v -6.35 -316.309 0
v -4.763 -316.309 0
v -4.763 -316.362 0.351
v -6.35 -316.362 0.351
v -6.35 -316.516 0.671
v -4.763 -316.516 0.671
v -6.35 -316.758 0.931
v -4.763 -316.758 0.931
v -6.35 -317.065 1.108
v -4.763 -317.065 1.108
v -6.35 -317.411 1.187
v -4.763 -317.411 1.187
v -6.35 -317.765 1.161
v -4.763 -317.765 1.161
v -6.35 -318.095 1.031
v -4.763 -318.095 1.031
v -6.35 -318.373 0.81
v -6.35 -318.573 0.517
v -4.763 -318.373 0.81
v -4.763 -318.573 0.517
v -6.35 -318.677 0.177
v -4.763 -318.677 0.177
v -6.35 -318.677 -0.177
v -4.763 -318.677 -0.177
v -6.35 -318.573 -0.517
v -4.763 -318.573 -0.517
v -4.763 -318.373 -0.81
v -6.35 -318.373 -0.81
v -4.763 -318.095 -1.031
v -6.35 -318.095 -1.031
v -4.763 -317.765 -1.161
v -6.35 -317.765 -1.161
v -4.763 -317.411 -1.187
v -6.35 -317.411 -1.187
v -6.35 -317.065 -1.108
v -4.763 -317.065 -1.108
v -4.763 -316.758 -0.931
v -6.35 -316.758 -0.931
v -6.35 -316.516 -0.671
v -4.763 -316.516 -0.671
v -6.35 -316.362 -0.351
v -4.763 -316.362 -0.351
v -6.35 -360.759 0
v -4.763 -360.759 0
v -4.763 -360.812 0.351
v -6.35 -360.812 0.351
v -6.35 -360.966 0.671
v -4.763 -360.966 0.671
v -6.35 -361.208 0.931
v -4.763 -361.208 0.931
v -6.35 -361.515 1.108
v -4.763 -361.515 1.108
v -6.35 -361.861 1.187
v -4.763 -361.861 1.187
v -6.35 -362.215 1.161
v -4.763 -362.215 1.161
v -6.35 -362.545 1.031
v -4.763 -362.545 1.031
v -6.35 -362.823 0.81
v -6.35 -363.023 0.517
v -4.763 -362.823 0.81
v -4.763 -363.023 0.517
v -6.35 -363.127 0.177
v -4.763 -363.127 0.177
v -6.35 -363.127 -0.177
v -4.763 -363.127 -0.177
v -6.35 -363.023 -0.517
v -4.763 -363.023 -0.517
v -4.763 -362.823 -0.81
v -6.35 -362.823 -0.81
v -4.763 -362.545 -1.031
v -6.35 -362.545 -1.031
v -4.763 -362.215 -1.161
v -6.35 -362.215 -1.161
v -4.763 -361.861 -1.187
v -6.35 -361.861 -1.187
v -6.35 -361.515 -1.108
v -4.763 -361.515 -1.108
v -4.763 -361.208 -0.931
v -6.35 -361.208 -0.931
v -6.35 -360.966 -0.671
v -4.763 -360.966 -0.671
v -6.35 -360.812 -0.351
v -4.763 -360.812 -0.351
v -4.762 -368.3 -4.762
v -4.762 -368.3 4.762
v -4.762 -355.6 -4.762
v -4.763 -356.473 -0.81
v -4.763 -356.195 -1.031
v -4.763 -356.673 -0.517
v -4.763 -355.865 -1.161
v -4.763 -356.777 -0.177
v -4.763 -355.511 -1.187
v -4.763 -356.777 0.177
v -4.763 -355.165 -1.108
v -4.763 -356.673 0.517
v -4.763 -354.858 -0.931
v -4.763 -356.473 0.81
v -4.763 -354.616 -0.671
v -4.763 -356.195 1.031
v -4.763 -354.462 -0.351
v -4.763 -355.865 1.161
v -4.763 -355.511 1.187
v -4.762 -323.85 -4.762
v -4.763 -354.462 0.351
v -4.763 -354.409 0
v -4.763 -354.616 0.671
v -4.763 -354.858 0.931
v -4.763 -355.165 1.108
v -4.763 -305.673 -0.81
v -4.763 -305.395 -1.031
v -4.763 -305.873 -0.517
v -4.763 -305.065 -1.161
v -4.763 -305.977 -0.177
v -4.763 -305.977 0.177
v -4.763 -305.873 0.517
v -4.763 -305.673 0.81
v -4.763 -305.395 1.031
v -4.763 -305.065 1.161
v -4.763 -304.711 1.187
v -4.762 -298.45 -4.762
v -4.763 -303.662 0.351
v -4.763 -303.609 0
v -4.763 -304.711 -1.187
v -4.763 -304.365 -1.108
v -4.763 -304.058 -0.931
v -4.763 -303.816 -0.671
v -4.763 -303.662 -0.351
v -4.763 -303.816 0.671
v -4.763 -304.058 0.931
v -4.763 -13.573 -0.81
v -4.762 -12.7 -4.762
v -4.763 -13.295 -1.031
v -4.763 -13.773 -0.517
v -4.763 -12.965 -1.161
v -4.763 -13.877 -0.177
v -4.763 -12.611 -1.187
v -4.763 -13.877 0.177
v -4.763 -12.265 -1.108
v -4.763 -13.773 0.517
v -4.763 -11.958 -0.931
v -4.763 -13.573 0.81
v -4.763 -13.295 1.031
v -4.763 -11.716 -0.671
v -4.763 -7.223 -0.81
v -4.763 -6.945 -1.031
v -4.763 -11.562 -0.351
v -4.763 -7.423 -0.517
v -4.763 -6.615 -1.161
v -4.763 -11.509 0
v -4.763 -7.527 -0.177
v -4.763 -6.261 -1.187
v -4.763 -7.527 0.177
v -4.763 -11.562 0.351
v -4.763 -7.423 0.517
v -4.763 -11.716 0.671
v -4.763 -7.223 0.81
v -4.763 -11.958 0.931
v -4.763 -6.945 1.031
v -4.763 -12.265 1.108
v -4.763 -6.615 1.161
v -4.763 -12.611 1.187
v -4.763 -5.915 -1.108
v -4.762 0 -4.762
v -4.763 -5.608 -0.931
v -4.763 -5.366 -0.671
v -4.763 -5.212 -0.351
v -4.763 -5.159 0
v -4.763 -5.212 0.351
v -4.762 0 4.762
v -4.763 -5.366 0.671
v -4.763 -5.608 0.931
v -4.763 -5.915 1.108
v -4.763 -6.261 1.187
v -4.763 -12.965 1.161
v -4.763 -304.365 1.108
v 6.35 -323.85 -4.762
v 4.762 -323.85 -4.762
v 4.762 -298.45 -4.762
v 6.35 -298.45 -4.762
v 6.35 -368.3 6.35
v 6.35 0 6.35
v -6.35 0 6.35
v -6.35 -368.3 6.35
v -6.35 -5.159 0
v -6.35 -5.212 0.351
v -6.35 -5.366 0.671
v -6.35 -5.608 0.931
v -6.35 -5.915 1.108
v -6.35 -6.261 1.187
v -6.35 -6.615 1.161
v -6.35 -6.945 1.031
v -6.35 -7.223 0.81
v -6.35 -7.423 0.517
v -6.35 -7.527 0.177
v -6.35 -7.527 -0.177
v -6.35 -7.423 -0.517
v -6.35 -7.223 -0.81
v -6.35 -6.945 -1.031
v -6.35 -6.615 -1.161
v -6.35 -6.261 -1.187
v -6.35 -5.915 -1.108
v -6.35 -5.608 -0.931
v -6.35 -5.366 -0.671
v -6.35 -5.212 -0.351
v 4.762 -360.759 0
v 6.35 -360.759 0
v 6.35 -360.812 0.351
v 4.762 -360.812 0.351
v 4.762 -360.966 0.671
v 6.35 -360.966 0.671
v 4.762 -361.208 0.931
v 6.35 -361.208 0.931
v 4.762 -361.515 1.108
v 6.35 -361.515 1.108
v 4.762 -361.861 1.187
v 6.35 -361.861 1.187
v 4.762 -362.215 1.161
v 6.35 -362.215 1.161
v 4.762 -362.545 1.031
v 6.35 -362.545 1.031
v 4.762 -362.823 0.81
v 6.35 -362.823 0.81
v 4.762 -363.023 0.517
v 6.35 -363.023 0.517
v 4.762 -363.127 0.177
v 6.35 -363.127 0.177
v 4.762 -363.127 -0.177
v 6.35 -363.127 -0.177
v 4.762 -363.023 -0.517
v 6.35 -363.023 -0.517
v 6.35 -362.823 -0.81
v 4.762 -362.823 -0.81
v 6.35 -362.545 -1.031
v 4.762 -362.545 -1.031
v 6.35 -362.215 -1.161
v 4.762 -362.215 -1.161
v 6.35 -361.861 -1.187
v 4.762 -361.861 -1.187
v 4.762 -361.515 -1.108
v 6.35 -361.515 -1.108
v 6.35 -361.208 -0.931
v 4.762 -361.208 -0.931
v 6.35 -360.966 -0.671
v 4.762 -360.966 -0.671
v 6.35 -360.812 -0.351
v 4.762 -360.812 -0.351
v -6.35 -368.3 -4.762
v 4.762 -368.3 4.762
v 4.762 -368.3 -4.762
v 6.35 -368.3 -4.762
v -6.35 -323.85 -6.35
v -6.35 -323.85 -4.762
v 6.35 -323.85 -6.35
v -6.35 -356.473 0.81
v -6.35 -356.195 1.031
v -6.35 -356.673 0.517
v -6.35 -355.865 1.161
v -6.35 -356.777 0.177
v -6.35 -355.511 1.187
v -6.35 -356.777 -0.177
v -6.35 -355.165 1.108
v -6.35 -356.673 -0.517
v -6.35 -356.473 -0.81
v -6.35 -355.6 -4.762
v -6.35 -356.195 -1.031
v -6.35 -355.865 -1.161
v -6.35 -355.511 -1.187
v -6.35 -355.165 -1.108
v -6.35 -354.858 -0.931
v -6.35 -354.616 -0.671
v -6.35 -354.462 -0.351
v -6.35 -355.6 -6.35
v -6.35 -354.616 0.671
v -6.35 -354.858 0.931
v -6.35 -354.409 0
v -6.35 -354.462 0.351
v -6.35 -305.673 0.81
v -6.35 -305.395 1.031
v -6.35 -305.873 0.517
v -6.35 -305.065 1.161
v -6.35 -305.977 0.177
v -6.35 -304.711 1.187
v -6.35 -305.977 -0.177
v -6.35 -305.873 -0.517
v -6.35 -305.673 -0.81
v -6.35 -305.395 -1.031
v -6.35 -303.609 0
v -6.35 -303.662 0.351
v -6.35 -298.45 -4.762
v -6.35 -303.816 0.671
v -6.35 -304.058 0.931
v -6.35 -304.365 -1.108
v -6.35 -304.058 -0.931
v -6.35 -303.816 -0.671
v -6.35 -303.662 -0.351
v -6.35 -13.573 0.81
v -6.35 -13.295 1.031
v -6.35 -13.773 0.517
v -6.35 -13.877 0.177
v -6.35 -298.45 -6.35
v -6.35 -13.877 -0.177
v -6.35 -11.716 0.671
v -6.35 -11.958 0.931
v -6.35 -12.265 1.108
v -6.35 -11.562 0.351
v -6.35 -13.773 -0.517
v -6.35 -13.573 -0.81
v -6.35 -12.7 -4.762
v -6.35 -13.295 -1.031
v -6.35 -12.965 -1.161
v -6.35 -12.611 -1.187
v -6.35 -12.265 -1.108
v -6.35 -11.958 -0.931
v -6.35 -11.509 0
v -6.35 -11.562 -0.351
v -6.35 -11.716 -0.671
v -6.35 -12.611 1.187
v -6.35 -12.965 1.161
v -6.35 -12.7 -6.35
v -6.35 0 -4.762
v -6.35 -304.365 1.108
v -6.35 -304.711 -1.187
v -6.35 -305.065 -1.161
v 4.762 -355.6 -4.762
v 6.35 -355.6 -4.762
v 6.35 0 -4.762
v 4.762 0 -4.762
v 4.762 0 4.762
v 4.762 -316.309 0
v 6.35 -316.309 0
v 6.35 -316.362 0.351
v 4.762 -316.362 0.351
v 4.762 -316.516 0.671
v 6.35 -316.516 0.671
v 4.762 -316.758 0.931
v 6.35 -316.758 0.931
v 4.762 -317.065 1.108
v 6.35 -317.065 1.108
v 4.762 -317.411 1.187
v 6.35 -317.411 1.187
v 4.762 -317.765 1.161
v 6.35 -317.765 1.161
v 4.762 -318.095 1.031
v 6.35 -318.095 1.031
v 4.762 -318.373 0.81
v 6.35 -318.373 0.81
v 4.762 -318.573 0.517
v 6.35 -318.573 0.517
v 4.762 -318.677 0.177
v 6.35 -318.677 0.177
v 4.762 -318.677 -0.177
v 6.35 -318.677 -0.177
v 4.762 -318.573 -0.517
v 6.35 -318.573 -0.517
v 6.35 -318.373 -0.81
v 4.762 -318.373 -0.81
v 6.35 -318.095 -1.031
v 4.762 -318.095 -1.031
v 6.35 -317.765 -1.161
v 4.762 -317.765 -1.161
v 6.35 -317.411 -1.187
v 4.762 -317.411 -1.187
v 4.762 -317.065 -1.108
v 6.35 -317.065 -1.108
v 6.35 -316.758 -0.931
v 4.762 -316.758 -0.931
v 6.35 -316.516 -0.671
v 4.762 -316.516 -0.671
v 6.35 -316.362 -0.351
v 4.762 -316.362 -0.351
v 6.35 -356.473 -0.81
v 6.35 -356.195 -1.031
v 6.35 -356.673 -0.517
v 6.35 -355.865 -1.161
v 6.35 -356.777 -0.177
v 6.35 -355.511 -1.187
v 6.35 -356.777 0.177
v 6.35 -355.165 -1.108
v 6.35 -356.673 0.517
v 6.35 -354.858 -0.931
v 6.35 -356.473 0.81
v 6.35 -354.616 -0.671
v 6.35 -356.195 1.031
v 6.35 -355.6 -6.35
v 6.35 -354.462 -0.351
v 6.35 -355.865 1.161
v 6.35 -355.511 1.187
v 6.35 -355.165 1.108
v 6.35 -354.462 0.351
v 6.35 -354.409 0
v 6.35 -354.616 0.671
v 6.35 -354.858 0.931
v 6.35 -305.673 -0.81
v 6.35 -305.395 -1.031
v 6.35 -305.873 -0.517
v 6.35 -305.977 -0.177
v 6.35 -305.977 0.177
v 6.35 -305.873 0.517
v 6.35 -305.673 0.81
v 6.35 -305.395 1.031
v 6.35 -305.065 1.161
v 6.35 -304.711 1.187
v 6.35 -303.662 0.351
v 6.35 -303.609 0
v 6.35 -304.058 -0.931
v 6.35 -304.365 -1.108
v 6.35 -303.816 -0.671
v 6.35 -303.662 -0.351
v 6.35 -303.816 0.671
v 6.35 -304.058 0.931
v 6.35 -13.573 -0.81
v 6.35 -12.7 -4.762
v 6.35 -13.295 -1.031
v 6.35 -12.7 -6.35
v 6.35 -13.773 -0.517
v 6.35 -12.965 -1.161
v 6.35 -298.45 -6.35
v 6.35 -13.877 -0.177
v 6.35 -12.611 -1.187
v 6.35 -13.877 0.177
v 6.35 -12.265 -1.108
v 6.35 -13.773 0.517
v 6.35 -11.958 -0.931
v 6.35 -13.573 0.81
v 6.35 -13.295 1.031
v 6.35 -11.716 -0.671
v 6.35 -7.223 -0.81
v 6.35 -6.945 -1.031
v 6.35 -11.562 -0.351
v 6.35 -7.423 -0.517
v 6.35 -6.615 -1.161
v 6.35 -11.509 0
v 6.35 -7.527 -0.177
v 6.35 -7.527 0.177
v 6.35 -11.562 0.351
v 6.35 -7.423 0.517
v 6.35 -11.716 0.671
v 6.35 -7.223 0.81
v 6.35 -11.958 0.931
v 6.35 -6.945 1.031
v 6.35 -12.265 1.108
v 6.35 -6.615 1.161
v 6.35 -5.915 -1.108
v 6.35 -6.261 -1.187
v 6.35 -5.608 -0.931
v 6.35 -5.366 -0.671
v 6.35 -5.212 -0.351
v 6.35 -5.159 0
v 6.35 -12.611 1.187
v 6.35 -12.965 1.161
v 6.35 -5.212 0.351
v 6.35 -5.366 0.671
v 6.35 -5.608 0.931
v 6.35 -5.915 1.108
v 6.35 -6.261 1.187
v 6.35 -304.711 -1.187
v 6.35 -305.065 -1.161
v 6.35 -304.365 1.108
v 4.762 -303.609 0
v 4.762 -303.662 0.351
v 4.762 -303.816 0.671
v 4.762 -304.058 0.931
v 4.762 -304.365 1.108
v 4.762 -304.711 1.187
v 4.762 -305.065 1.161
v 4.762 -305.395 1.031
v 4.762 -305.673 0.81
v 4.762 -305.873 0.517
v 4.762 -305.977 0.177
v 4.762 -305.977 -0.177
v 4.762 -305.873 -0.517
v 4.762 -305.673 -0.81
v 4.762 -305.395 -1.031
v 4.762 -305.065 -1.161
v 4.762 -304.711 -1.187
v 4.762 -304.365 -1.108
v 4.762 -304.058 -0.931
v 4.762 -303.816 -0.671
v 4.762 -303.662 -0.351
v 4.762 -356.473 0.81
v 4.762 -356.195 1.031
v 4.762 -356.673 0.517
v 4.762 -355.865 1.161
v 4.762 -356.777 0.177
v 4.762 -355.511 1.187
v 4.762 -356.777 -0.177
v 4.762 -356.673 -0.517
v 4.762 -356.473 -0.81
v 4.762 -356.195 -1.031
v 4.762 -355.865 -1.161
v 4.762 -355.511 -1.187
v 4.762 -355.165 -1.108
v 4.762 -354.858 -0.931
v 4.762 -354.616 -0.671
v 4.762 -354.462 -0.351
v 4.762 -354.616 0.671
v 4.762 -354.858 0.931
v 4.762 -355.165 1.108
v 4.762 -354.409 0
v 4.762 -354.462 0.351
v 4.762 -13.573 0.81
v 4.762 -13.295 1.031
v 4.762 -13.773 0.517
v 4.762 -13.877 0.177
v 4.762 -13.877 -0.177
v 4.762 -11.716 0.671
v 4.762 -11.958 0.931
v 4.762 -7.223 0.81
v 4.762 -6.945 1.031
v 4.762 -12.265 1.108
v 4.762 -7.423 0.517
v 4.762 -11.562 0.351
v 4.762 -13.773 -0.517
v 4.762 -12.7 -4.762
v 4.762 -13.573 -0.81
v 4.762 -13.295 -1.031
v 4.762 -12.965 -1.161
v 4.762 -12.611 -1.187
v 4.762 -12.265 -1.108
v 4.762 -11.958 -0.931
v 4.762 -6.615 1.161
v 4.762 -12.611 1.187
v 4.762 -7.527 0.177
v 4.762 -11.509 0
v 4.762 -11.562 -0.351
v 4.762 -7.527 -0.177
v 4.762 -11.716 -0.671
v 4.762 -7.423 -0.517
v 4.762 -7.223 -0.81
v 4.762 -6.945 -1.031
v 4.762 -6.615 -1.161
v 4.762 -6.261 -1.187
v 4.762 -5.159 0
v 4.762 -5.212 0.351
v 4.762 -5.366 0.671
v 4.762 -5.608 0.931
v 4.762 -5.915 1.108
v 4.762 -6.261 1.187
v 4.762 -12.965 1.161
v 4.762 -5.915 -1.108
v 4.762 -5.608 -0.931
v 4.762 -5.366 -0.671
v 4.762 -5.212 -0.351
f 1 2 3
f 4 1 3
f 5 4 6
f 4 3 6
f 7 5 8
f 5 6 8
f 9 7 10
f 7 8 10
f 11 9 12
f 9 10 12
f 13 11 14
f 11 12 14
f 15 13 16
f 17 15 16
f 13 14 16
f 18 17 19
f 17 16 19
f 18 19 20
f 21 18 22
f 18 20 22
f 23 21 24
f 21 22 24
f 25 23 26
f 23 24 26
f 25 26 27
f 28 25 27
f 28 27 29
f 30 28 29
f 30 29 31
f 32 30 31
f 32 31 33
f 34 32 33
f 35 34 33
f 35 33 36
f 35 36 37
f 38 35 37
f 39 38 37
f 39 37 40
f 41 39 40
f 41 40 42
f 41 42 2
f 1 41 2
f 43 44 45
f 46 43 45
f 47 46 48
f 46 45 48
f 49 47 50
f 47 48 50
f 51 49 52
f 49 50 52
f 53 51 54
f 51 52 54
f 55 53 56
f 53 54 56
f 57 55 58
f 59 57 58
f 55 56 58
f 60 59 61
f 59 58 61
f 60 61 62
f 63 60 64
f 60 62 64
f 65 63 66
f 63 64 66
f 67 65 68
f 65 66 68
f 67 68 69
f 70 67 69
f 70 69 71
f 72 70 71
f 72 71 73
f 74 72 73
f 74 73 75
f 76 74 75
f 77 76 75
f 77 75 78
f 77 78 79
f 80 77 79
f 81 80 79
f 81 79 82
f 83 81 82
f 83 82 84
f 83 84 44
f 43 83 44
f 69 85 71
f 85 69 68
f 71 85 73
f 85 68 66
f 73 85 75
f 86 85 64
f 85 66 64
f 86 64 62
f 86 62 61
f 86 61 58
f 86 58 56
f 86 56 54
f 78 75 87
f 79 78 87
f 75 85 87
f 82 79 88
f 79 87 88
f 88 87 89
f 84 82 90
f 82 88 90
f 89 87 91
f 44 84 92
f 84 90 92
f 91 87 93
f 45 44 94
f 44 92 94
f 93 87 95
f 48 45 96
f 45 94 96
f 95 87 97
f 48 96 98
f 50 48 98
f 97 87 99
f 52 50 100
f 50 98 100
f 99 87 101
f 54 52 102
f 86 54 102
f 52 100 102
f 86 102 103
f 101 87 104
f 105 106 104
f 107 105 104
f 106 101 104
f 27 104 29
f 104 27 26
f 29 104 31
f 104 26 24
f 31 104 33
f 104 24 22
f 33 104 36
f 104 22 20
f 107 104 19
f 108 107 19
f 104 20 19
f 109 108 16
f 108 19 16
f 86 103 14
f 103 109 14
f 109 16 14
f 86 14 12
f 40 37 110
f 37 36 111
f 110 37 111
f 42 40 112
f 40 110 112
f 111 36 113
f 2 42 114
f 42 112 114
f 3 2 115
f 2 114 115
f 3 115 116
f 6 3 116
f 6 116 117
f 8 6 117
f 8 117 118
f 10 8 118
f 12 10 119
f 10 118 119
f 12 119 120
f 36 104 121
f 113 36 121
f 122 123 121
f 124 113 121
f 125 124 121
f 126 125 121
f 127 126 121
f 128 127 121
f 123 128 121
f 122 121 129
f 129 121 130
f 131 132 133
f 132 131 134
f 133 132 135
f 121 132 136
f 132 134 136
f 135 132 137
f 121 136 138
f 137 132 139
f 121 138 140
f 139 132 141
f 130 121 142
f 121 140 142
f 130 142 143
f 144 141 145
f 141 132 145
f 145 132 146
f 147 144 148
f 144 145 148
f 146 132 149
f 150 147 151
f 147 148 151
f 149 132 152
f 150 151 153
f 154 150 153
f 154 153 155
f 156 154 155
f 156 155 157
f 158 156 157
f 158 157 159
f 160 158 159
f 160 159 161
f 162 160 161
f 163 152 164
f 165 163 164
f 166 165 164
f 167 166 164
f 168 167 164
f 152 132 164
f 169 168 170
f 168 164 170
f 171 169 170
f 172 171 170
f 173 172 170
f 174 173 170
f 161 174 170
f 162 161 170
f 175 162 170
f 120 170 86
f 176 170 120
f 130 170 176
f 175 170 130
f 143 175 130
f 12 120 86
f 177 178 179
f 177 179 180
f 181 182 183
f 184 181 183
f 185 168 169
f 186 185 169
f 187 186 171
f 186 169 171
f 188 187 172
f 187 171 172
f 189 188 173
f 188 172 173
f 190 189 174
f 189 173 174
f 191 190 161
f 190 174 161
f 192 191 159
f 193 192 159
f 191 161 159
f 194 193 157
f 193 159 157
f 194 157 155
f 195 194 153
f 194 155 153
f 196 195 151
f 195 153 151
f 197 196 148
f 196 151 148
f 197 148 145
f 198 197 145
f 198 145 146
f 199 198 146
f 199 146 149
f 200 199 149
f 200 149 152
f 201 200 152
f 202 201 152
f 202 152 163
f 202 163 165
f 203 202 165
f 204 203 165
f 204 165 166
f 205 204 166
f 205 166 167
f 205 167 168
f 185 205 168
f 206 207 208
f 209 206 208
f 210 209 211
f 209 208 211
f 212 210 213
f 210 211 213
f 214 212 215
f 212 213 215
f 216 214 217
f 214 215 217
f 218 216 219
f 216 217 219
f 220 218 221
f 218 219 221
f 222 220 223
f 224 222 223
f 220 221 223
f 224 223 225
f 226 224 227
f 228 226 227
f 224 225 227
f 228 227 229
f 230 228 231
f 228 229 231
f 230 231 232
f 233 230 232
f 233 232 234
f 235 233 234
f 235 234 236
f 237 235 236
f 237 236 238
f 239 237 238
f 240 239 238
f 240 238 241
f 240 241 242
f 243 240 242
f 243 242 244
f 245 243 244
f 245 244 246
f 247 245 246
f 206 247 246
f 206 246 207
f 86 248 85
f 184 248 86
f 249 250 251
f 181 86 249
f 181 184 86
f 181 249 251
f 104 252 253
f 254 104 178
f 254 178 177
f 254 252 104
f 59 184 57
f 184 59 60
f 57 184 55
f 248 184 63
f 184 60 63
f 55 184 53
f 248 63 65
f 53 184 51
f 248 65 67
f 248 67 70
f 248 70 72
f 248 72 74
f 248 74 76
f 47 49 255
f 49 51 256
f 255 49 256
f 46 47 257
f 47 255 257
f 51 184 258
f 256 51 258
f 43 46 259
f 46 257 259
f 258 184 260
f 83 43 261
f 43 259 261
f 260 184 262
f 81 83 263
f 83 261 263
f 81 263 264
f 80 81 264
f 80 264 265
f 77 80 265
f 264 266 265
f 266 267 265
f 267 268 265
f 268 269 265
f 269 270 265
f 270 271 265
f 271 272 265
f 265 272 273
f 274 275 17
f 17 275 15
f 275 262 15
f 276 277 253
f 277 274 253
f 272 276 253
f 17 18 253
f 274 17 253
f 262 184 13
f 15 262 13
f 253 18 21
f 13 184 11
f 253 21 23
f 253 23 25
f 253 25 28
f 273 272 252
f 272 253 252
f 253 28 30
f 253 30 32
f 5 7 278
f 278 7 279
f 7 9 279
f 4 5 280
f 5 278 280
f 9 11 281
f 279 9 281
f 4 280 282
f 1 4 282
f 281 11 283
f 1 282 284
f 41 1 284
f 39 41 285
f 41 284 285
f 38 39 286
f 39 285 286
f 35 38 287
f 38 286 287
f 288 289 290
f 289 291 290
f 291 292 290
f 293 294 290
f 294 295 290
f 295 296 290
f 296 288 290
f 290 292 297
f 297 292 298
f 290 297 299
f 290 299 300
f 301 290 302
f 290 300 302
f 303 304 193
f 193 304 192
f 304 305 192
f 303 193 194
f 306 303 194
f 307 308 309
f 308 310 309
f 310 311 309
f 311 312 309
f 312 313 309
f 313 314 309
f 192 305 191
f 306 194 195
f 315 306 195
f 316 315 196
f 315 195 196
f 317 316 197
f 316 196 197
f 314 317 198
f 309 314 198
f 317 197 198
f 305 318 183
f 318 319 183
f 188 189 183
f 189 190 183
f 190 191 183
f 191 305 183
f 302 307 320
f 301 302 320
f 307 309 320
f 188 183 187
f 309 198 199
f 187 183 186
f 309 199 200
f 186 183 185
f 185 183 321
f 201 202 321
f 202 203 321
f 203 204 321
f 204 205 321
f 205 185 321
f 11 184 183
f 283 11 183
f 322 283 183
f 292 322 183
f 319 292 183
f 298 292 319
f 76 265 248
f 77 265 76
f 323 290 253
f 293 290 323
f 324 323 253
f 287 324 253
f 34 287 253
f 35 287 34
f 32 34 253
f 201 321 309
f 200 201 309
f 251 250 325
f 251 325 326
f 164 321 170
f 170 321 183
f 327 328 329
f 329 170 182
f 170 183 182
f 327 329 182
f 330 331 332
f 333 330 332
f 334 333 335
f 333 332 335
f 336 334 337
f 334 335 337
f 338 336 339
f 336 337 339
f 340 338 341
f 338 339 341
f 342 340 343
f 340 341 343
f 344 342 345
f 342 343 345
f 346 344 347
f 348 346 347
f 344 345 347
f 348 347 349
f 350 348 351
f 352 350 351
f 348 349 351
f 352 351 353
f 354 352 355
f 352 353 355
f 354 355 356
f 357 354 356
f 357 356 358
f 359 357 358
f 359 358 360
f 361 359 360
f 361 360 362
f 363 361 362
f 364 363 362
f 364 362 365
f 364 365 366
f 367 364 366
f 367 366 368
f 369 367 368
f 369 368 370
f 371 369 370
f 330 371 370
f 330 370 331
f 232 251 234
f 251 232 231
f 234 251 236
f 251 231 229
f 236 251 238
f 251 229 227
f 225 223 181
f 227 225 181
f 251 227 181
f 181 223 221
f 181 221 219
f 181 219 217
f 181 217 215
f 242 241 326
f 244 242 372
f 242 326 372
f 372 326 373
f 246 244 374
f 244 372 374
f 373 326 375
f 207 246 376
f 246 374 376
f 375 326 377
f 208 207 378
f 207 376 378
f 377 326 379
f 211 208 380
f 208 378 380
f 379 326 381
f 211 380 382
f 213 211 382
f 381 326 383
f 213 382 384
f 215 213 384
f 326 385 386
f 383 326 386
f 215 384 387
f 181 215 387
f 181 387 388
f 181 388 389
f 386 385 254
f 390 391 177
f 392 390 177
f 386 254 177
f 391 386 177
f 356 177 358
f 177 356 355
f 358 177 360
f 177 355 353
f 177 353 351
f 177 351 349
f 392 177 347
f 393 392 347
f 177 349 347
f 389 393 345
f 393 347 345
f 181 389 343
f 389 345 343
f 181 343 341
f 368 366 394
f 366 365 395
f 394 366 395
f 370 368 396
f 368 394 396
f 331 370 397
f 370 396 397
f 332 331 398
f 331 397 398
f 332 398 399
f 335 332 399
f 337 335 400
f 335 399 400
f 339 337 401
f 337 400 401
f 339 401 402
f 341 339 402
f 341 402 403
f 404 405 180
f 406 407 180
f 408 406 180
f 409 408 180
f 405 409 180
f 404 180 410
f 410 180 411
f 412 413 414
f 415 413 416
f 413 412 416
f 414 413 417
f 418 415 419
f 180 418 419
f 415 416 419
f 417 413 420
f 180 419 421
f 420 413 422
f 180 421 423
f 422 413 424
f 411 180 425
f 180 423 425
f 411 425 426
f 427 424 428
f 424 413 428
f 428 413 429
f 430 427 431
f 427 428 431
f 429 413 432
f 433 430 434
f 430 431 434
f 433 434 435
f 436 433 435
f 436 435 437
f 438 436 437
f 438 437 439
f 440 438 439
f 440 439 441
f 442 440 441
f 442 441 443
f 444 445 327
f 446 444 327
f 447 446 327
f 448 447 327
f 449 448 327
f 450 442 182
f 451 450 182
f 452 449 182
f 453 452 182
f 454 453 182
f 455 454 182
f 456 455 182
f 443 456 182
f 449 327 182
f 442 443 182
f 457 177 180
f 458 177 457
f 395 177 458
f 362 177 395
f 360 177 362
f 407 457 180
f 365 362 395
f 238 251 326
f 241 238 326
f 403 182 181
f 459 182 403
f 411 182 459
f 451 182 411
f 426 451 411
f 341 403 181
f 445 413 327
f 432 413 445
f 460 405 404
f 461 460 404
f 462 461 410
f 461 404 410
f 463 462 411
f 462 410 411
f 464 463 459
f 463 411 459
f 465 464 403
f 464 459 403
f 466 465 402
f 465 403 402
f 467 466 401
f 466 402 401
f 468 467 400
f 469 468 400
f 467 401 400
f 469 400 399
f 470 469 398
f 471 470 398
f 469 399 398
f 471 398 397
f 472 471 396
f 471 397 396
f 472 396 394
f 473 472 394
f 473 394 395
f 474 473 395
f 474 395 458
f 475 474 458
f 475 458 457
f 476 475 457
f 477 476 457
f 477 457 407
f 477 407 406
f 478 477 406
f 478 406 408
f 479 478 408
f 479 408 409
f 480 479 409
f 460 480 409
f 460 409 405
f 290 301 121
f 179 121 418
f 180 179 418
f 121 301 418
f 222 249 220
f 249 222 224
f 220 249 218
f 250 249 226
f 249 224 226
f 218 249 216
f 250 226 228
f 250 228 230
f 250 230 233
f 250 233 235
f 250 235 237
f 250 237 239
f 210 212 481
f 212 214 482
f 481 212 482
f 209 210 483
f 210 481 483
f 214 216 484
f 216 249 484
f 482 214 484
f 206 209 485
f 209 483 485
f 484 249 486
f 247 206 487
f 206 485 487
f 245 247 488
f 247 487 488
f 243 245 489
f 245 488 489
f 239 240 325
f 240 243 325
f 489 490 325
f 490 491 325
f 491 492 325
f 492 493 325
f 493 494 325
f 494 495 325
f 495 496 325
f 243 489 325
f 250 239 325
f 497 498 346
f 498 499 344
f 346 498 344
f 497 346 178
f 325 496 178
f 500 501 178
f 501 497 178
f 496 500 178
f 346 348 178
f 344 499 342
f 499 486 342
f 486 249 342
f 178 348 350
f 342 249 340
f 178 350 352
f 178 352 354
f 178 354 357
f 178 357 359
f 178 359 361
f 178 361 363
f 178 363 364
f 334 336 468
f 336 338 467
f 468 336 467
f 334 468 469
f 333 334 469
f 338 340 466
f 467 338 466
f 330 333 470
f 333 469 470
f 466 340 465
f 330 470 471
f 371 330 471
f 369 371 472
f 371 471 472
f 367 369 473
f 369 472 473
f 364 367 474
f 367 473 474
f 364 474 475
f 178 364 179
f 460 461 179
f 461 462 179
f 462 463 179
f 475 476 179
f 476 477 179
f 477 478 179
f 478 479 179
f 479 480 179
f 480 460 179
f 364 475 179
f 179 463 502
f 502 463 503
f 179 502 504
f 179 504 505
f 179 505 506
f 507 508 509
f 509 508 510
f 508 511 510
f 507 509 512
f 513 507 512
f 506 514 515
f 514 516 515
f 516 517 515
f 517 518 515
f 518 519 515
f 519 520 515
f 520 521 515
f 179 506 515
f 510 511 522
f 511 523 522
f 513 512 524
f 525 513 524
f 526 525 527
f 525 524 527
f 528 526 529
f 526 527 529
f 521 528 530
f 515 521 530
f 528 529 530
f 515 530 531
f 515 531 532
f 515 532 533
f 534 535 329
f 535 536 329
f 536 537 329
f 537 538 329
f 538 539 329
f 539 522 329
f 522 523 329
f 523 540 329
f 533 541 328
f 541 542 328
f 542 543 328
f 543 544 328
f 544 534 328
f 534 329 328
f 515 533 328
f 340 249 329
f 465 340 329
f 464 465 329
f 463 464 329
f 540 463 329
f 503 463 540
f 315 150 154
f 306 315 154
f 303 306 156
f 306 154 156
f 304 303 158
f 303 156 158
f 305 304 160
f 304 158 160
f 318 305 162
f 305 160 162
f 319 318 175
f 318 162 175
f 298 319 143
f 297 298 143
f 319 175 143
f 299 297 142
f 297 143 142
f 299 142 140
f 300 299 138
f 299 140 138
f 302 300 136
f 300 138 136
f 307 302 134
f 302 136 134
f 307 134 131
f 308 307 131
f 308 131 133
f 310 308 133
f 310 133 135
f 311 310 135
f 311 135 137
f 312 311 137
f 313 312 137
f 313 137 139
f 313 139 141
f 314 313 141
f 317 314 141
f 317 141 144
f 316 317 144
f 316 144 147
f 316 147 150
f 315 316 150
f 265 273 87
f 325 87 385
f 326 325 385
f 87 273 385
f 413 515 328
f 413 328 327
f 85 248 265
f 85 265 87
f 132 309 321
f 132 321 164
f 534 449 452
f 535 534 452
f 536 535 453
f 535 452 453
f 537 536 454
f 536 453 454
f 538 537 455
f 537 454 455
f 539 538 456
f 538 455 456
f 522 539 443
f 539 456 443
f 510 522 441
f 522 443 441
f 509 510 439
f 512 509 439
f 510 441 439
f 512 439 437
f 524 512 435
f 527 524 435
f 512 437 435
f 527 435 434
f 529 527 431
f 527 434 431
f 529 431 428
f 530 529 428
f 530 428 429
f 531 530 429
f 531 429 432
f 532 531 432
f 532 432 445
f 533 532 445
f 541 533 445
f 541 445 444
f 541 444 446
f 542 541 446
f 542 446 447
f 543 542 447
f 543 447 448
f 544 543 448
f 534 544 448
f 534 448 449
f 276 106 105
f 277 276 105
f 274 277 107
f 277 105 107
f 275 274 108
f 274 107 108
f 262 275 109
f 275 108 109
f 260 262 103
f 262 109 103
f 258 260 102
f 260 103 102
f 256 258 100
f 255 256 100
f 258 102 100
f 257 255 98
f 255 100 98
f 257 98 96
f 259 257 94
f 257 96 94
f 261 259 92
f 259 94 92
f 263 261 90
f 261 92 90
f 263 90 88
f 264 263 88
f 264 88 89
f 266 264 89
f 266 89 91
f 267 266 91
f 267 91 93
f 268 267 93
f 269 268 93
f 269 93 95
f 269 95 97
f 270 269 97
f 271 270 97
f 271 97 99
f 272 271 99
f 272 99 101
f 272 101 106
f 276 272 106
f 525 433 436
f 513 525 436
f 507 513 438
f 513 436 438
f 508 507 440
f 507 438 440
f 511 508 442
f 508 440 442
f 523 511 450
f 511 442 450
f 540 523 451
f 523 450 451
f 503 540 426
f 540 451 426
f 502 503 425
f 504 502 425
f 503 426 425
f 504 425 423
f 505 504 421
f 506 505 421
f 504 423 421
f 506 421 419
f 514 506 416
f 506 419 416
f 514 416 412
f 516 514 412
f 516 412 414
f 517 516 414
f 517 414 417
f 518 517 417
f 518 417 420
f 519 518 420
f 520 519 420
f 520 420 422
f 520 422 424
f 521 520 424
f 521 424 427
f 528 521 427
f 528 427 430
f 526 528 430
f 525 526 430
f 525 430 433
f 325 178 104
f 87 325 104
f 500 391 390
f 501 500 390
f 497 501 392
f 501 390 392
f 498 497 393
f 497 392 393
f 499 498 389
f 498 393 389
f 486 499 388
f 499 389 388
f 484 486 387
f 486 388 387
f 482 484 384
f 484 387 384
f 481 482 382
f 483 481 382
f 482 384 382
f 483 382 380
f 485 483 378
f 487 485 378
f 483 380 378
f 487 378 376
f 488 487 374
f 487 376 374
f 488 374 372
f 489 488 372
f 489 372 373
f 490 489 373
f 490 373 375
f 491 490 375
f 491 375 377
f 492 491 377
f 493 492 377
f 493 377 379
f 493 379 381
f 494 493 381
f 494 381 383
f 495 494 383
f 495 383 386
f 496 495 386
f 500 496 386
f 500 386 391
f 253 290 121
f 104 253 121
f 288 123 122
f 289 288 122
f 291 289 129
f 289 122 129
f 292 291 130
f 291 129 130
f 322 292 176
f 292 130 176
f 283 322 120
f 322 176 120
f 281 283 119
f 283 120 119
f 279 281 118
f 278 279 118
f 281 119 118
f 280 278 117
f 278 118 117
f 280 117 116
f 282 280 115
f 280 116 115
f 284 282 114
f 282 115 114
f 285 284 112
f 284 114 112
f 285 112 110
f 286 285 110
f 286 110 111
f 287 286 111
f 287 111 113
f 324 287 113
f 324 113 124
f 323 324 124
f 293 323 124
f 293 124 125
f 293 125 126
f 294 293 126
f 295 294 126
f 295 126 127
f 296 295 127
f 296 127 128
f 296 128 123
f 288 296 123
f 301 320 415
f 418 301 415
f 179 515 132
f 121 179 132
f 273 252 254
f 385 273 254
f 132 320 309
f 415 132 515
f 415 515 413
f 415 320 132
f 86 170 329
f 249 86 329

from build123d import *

# Parameters (mm, degrees)
F1_DEPTH = 368.3
F2_R     = 1.190625
F3_DEPTH = 12.701
F4_W     = 12.7
F4_H     = 25.4
F4_H_2   = 12.7
F5_DEPTH = 1.5875


with BuildPart() as f1:
    # F0 (on Front) → F1 (new body)
    with BuildSketch(Plane.XZ):
        Polygon((0, 4.7625), (4.7625, 4.7625), (4.7625, 0), (6.35, 0), (6.35, 6.35), (0, 6.35), align=None)
        Polygon((-4.7625, 4.7625), (0, 4.7625), (0, 6.35), (-6.35, 6.35), (-6.35, -6.35), (6.35, -6.35), (6.35, 0), (4.7625, 0), (4.7625, -4.7625), (-4.7625, -4.7625), align=None)
    extrude(amount=F1_DEPTH)

    # F2 (on face) → F3 (cut, through all)
    with BuildSketch(Plane.YZ.offset(6.35)):
        with Locations((-317.5, 0)):
            Circle(F2_R)
        with Locations((-304.8, 0)):
            Circle(F2_R)
        with Locations((-361.95, 0)):
            Circle(F2_R)
        with Locations((-355.6, 0)):
            Circle(F2_R)
        with Locations((-6.35, 0)):
            Circle(F2_R)
        with Locations((-12.7, 0)):
            Circle(F2_R)
    extrude(amount=-F3_DEPTH, mode=Mode.SUBTRACT)

    # F4 (on face) → F5 (cut, through all)
    with BuildSketch(Plane(origin=(0, 0, -6.35), x_dir=(1, 0, 0), z_dir=(0, 0, -1))):
        with Locations((0, 311.15)):
            Rectangle(F4_W, F4_H)
        with Locations((0, 361.95)):
            Rectangle(F4_W, F4_H_2)
        with Locations((0, 6.35)):
            Rectangle(F4_W, F4_H_2)
    extrude(amount=-F5_DEPTH, mode=Mode.SUBTRACT)


solid = f1.part
